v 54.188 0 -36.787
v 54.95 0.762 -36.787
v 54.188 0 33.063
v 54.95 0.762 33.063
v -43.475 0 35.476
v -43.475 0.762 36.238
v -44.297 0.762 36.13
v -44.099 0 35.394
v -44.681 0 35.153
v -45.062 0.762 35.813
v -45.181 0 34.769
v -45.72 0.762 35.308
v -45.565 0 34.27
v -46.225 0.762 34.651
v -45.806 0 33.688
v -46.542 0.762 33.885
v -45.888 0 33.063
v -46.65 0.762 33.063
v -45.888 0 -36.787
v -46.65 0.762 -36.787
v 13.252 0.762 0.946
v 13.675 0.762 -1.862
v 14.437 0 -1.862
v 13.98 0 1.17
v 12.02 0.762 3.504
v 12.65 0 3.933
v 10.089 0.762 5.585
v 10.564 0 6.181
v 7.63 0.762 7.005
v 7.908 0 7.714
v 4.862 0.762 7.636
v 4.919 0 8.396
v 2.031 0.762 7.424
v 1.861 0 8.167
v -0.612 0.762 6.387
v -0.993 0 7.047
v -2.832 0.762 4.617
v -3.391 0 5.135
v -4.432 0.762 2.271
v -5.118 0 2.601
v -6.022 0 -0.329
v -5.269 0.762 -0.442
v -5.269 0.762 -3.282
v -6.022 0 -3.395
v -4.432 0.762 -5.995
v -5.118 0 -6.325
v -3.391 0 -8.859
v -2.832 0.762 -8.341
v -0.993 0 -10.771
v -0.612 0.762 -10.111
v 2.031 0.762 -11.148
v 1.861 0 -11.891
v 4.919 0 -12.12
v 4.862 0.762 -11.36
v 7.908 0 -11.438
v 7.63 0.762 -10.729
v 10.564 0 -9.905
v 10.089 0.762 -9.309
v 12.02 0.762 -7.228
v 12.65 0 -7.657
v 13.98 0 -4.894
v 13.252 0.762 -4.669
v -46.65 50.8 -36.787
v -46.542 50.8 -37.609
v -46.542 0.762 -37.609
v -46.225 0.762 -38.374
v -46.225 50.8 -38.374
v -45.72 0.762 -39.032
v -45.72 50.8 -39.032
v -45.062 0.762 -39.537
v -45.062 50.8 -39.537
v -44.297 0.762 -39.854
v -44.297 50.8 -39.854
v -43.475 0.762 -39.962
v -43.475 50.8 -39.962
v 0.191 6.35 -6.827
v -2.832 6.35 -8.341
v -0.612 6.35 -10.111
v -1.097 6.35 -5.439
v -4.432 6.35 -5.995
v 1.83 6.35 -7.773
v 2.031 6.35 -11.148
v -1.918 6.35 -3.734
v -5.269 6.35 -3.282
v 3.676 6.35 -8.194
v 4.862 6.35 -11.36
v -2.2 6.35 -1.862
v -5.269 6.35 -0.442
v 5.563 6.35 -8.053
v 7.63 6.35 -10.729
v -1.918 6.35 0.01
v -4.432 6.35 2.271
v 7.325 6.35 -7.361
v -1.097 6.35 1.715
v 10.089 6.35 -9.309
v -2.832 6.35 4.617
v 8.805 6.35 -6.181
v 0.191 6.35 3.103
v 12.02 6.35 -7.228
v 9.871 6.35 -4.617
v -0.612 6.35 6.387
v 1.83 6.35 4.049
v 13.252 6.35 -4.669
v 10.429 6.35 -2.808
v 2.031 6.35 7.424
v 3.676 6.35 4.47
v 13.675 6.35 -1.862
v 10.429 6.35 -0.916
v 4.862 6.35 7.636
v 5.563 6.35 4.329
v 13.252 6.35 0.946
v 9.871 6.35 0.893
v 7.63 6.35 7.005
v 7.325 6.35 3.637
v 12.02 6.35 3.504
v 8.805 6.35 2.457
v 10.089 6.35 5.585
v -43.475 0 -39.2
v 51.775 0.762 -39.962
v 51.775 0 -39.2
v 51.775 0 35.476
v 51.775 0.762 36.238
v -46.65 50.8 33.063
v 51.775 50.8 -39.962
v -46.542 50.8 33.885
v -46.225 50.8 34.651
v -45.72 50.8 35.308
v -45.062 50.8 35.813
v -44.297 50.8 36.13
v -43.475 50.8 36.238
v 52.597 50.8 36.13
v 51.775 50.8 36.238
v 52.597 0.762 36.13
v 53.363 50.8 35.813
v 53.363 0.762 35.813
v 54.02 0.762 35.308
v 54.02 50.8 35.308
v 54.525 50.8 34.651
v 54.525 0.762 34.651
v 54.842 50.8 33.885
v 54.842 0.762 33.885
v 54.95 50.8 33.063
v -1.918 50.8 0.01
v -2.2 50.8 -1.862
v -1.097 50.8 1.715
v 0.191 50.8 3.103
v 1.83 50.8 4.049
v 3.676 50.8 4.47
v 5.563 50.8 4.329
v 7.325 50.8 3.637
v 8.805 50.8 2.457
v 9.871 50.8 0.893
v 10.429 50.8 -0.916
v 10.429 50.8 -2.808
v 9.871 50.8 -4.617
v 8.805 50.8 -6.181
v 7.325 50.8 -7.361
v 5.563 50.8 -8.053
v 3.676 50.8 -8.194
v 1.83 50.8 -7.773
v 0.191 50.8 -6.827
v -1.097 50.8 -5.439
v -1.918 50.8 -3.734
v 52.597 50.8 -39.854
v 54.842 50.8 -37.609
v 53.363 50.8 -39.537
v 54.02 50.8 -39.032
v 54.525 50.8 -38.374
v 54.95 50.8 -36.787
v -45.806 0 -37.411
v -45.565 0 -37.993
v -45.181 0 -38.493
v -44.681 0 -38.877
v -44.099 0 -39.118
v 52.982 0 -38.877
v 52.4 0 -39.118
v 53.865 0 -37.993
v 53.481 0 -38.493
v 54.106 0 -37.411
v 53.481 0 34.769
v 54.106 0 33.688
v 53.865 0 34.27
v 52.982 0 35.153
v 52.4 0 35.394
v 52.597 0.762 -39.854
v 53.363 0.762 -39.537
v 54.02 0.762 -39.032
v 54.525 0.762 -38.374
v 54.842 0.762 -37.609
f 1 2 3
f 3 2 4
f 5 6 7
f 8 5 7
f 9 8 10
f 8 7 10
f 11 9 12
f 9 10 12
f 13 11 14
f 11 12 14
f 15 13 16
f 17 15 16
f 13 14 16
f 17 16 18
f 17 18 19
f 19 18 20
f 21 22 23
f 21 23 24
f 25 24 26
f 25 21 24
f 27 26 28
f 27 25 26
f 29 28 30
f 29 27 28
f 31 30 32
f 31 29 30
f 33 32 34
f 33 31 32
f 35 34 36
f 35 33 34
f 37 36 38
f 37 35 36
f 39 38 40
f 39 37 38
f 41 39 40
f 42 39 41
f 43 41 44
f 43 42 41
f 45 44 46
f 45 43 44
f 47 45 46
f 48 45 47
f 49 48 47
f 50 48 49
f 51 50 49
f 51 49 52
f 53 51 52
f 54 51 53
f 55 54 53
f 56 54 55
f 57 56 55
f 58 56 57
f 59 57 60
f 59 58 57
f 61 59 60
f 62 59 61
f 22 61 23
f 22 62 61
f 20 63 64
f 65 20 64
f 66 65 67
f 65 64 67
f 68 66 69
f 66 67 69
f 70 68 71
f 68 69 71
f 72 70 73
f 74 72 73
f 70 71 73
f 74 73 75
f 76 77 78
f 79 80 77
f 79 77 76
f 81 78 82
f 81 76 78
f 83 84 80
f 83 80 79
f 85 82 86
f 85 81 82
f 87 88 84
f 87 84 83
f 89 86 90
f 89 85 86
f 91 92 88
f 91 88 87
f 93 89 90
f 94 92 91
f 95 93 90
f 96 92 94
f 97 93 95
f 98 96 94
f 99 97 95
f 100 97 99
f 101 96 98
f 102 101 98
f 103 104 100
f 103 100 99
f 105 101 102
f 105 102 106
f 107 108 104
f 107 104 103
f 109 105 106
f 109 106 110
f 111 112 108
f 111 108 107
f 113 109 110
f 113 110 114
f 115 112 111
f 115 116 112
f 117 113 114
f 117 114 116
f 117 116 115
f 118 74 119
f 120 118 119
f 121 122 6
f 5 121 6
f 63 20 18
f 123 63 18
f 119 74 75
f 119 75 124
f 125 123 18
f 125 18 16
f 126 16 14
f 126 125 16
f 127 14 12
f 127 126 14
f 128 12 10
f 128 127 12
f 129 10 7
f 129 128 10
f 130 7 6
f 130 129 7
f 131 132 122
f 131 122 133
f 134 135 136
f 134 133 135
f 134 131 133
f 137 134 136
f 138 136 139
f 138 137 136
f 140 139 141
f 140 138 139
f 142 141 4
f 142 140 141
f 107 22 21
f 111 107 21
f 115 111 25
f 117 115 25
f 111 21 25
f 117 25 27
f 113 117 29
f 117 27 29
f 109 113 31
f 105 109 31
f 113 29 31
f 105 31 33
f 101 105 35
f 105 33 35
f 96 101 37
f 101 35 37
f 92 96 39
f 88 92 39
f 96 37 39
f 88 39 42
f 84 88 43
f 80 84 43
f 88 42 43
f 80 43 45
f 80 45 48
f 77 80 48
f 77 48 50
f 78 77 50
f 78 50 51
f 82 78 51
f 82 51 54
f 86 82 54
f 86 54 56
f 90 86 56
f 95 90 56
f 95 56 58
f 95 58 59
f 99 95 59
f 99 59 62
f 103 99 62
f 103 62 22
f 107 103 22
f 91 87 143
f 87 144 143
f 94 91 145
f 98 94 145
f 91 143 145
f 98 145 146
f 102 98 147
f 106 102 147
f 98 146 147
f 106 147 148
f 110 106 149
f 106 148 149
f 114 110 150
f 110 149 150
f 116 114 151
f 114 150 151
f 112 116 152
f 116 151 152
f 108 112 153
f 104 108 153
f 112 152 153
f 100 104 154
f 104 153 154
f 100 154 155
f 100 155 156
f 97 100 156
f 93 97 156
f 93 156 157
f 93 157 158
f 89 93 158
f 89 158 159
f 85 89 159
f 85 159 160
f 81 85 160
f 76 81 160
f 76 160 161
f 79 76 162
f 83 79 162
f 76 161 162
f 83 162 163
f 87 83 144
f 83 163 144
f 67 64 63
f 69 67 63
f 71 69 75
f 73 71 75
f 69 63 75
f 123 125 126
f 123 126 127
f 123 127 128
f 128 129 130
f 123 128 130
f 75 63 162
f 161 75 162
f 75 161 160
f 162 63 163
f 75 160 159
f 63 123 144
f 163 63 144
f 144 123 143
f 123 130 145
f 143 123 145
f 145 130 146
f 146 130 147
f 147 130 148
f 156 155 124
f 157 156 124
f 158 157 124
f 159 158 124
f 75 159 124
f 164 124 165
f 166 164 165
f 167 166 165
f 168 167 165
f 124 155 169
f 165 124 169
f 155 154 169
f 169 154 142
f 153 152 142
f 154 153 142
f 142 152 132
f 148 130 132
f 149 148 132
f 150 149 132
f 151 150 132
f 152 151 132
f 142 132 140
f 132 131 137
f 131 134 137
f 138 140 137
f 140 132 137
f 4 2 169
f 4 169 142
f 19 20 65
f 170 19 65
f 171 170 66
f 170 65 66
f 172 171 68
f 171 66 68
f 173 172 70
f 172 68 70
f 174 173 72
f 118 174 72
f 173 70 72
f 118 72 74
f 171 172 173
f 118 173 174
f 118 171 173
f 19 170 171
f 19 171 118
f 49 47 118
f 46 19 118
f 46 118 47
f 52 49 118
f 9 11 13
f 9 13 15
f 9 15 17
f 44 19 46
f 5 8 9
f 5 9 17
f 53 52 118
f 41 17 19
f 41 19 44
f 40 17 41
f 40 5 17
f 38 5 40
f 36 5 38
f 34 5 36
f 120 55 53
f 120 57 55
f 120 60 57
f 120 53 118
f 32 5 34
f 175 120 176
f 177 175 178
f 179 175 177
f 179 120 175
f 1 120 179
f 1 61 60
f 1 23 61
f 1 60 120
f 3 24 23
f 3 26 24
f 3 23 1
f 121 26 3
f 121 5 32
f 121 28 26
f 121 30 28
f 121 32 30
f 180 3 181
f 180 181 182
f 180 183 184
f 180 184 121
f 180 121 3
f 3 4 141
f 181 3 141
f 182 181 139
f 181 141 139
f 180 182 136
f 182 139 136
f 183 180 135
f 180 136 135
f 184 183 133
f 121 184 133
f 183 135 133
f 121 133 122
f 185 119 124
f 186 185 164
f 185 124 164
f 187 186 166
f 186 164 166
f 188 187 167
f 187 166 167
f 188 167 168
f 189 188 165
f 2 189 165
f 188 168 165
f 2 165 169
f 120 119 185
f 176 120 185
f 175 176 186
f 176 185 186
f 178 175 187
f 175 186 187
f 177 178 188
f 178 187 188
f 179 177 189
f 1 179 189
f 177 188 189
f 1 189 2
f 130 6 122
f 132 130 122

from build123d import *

# Parameters (mm, degrees)
F0_W           = 101.6
F0_H           = 76.2
F1_DEPTH       = 50.8
F3_D           = 12.7
F3_CBORE_D     = 19.05
F3_CBORE_DEPTH = 6.35
F4_R           = 3.175
F5_SIZE        = 0.762


with BuildPart() as f1:
    # F0 (on Front) → F1 (new body)
    with BuildSketch(Plane.XZ):
        with Locations((4.1500981897, -1.8619502484)):
            Rectangle(F0_W, F0_H)
    extrude(amount=-F1_DEPTH)

    # F3 (through all)
    with Locations(Plane.XZ):
        with Locations((4.1500981897, -1.8619502484)):
            CounterBoreHole(F3_D / 2, F3_CBORE_D / 2, F3_CBORE_DEPTH)

    # F4
    f4_edges = [f1.edges().sort_by_distance(p)[0] for p in [
        (54.950098, 25.4, 36.23805),
        (-46.649902, 25.4, 36.23805),
        (54.950098, 25.4, -39.96195),
        (-46.649902, 25.4, -39.96195),
    ]]
    fillet(f4_edges, radius=F4_R)

    # F5
    f5_edges = [f1.edges().sort_by_distance(p)[0] for p in [
        (4.150098, 0, -39.96195),
        (-45.719966, 0, -39.032014),
        (54.020162, 0, -39.032014),
        (-46.649902, 0, -1.86195),
        (54.950098, 0, -1.86195),
        (-45.719966, 0, 35.308114),
        (54.020162, 0, 35.308114),
        (4.150098, 0, 36.23805),
        (-5.374902, 0, -1.86195),
    ]]
    chamfer(f5_edges, length=F5_SIZE)


solid = f1.part
